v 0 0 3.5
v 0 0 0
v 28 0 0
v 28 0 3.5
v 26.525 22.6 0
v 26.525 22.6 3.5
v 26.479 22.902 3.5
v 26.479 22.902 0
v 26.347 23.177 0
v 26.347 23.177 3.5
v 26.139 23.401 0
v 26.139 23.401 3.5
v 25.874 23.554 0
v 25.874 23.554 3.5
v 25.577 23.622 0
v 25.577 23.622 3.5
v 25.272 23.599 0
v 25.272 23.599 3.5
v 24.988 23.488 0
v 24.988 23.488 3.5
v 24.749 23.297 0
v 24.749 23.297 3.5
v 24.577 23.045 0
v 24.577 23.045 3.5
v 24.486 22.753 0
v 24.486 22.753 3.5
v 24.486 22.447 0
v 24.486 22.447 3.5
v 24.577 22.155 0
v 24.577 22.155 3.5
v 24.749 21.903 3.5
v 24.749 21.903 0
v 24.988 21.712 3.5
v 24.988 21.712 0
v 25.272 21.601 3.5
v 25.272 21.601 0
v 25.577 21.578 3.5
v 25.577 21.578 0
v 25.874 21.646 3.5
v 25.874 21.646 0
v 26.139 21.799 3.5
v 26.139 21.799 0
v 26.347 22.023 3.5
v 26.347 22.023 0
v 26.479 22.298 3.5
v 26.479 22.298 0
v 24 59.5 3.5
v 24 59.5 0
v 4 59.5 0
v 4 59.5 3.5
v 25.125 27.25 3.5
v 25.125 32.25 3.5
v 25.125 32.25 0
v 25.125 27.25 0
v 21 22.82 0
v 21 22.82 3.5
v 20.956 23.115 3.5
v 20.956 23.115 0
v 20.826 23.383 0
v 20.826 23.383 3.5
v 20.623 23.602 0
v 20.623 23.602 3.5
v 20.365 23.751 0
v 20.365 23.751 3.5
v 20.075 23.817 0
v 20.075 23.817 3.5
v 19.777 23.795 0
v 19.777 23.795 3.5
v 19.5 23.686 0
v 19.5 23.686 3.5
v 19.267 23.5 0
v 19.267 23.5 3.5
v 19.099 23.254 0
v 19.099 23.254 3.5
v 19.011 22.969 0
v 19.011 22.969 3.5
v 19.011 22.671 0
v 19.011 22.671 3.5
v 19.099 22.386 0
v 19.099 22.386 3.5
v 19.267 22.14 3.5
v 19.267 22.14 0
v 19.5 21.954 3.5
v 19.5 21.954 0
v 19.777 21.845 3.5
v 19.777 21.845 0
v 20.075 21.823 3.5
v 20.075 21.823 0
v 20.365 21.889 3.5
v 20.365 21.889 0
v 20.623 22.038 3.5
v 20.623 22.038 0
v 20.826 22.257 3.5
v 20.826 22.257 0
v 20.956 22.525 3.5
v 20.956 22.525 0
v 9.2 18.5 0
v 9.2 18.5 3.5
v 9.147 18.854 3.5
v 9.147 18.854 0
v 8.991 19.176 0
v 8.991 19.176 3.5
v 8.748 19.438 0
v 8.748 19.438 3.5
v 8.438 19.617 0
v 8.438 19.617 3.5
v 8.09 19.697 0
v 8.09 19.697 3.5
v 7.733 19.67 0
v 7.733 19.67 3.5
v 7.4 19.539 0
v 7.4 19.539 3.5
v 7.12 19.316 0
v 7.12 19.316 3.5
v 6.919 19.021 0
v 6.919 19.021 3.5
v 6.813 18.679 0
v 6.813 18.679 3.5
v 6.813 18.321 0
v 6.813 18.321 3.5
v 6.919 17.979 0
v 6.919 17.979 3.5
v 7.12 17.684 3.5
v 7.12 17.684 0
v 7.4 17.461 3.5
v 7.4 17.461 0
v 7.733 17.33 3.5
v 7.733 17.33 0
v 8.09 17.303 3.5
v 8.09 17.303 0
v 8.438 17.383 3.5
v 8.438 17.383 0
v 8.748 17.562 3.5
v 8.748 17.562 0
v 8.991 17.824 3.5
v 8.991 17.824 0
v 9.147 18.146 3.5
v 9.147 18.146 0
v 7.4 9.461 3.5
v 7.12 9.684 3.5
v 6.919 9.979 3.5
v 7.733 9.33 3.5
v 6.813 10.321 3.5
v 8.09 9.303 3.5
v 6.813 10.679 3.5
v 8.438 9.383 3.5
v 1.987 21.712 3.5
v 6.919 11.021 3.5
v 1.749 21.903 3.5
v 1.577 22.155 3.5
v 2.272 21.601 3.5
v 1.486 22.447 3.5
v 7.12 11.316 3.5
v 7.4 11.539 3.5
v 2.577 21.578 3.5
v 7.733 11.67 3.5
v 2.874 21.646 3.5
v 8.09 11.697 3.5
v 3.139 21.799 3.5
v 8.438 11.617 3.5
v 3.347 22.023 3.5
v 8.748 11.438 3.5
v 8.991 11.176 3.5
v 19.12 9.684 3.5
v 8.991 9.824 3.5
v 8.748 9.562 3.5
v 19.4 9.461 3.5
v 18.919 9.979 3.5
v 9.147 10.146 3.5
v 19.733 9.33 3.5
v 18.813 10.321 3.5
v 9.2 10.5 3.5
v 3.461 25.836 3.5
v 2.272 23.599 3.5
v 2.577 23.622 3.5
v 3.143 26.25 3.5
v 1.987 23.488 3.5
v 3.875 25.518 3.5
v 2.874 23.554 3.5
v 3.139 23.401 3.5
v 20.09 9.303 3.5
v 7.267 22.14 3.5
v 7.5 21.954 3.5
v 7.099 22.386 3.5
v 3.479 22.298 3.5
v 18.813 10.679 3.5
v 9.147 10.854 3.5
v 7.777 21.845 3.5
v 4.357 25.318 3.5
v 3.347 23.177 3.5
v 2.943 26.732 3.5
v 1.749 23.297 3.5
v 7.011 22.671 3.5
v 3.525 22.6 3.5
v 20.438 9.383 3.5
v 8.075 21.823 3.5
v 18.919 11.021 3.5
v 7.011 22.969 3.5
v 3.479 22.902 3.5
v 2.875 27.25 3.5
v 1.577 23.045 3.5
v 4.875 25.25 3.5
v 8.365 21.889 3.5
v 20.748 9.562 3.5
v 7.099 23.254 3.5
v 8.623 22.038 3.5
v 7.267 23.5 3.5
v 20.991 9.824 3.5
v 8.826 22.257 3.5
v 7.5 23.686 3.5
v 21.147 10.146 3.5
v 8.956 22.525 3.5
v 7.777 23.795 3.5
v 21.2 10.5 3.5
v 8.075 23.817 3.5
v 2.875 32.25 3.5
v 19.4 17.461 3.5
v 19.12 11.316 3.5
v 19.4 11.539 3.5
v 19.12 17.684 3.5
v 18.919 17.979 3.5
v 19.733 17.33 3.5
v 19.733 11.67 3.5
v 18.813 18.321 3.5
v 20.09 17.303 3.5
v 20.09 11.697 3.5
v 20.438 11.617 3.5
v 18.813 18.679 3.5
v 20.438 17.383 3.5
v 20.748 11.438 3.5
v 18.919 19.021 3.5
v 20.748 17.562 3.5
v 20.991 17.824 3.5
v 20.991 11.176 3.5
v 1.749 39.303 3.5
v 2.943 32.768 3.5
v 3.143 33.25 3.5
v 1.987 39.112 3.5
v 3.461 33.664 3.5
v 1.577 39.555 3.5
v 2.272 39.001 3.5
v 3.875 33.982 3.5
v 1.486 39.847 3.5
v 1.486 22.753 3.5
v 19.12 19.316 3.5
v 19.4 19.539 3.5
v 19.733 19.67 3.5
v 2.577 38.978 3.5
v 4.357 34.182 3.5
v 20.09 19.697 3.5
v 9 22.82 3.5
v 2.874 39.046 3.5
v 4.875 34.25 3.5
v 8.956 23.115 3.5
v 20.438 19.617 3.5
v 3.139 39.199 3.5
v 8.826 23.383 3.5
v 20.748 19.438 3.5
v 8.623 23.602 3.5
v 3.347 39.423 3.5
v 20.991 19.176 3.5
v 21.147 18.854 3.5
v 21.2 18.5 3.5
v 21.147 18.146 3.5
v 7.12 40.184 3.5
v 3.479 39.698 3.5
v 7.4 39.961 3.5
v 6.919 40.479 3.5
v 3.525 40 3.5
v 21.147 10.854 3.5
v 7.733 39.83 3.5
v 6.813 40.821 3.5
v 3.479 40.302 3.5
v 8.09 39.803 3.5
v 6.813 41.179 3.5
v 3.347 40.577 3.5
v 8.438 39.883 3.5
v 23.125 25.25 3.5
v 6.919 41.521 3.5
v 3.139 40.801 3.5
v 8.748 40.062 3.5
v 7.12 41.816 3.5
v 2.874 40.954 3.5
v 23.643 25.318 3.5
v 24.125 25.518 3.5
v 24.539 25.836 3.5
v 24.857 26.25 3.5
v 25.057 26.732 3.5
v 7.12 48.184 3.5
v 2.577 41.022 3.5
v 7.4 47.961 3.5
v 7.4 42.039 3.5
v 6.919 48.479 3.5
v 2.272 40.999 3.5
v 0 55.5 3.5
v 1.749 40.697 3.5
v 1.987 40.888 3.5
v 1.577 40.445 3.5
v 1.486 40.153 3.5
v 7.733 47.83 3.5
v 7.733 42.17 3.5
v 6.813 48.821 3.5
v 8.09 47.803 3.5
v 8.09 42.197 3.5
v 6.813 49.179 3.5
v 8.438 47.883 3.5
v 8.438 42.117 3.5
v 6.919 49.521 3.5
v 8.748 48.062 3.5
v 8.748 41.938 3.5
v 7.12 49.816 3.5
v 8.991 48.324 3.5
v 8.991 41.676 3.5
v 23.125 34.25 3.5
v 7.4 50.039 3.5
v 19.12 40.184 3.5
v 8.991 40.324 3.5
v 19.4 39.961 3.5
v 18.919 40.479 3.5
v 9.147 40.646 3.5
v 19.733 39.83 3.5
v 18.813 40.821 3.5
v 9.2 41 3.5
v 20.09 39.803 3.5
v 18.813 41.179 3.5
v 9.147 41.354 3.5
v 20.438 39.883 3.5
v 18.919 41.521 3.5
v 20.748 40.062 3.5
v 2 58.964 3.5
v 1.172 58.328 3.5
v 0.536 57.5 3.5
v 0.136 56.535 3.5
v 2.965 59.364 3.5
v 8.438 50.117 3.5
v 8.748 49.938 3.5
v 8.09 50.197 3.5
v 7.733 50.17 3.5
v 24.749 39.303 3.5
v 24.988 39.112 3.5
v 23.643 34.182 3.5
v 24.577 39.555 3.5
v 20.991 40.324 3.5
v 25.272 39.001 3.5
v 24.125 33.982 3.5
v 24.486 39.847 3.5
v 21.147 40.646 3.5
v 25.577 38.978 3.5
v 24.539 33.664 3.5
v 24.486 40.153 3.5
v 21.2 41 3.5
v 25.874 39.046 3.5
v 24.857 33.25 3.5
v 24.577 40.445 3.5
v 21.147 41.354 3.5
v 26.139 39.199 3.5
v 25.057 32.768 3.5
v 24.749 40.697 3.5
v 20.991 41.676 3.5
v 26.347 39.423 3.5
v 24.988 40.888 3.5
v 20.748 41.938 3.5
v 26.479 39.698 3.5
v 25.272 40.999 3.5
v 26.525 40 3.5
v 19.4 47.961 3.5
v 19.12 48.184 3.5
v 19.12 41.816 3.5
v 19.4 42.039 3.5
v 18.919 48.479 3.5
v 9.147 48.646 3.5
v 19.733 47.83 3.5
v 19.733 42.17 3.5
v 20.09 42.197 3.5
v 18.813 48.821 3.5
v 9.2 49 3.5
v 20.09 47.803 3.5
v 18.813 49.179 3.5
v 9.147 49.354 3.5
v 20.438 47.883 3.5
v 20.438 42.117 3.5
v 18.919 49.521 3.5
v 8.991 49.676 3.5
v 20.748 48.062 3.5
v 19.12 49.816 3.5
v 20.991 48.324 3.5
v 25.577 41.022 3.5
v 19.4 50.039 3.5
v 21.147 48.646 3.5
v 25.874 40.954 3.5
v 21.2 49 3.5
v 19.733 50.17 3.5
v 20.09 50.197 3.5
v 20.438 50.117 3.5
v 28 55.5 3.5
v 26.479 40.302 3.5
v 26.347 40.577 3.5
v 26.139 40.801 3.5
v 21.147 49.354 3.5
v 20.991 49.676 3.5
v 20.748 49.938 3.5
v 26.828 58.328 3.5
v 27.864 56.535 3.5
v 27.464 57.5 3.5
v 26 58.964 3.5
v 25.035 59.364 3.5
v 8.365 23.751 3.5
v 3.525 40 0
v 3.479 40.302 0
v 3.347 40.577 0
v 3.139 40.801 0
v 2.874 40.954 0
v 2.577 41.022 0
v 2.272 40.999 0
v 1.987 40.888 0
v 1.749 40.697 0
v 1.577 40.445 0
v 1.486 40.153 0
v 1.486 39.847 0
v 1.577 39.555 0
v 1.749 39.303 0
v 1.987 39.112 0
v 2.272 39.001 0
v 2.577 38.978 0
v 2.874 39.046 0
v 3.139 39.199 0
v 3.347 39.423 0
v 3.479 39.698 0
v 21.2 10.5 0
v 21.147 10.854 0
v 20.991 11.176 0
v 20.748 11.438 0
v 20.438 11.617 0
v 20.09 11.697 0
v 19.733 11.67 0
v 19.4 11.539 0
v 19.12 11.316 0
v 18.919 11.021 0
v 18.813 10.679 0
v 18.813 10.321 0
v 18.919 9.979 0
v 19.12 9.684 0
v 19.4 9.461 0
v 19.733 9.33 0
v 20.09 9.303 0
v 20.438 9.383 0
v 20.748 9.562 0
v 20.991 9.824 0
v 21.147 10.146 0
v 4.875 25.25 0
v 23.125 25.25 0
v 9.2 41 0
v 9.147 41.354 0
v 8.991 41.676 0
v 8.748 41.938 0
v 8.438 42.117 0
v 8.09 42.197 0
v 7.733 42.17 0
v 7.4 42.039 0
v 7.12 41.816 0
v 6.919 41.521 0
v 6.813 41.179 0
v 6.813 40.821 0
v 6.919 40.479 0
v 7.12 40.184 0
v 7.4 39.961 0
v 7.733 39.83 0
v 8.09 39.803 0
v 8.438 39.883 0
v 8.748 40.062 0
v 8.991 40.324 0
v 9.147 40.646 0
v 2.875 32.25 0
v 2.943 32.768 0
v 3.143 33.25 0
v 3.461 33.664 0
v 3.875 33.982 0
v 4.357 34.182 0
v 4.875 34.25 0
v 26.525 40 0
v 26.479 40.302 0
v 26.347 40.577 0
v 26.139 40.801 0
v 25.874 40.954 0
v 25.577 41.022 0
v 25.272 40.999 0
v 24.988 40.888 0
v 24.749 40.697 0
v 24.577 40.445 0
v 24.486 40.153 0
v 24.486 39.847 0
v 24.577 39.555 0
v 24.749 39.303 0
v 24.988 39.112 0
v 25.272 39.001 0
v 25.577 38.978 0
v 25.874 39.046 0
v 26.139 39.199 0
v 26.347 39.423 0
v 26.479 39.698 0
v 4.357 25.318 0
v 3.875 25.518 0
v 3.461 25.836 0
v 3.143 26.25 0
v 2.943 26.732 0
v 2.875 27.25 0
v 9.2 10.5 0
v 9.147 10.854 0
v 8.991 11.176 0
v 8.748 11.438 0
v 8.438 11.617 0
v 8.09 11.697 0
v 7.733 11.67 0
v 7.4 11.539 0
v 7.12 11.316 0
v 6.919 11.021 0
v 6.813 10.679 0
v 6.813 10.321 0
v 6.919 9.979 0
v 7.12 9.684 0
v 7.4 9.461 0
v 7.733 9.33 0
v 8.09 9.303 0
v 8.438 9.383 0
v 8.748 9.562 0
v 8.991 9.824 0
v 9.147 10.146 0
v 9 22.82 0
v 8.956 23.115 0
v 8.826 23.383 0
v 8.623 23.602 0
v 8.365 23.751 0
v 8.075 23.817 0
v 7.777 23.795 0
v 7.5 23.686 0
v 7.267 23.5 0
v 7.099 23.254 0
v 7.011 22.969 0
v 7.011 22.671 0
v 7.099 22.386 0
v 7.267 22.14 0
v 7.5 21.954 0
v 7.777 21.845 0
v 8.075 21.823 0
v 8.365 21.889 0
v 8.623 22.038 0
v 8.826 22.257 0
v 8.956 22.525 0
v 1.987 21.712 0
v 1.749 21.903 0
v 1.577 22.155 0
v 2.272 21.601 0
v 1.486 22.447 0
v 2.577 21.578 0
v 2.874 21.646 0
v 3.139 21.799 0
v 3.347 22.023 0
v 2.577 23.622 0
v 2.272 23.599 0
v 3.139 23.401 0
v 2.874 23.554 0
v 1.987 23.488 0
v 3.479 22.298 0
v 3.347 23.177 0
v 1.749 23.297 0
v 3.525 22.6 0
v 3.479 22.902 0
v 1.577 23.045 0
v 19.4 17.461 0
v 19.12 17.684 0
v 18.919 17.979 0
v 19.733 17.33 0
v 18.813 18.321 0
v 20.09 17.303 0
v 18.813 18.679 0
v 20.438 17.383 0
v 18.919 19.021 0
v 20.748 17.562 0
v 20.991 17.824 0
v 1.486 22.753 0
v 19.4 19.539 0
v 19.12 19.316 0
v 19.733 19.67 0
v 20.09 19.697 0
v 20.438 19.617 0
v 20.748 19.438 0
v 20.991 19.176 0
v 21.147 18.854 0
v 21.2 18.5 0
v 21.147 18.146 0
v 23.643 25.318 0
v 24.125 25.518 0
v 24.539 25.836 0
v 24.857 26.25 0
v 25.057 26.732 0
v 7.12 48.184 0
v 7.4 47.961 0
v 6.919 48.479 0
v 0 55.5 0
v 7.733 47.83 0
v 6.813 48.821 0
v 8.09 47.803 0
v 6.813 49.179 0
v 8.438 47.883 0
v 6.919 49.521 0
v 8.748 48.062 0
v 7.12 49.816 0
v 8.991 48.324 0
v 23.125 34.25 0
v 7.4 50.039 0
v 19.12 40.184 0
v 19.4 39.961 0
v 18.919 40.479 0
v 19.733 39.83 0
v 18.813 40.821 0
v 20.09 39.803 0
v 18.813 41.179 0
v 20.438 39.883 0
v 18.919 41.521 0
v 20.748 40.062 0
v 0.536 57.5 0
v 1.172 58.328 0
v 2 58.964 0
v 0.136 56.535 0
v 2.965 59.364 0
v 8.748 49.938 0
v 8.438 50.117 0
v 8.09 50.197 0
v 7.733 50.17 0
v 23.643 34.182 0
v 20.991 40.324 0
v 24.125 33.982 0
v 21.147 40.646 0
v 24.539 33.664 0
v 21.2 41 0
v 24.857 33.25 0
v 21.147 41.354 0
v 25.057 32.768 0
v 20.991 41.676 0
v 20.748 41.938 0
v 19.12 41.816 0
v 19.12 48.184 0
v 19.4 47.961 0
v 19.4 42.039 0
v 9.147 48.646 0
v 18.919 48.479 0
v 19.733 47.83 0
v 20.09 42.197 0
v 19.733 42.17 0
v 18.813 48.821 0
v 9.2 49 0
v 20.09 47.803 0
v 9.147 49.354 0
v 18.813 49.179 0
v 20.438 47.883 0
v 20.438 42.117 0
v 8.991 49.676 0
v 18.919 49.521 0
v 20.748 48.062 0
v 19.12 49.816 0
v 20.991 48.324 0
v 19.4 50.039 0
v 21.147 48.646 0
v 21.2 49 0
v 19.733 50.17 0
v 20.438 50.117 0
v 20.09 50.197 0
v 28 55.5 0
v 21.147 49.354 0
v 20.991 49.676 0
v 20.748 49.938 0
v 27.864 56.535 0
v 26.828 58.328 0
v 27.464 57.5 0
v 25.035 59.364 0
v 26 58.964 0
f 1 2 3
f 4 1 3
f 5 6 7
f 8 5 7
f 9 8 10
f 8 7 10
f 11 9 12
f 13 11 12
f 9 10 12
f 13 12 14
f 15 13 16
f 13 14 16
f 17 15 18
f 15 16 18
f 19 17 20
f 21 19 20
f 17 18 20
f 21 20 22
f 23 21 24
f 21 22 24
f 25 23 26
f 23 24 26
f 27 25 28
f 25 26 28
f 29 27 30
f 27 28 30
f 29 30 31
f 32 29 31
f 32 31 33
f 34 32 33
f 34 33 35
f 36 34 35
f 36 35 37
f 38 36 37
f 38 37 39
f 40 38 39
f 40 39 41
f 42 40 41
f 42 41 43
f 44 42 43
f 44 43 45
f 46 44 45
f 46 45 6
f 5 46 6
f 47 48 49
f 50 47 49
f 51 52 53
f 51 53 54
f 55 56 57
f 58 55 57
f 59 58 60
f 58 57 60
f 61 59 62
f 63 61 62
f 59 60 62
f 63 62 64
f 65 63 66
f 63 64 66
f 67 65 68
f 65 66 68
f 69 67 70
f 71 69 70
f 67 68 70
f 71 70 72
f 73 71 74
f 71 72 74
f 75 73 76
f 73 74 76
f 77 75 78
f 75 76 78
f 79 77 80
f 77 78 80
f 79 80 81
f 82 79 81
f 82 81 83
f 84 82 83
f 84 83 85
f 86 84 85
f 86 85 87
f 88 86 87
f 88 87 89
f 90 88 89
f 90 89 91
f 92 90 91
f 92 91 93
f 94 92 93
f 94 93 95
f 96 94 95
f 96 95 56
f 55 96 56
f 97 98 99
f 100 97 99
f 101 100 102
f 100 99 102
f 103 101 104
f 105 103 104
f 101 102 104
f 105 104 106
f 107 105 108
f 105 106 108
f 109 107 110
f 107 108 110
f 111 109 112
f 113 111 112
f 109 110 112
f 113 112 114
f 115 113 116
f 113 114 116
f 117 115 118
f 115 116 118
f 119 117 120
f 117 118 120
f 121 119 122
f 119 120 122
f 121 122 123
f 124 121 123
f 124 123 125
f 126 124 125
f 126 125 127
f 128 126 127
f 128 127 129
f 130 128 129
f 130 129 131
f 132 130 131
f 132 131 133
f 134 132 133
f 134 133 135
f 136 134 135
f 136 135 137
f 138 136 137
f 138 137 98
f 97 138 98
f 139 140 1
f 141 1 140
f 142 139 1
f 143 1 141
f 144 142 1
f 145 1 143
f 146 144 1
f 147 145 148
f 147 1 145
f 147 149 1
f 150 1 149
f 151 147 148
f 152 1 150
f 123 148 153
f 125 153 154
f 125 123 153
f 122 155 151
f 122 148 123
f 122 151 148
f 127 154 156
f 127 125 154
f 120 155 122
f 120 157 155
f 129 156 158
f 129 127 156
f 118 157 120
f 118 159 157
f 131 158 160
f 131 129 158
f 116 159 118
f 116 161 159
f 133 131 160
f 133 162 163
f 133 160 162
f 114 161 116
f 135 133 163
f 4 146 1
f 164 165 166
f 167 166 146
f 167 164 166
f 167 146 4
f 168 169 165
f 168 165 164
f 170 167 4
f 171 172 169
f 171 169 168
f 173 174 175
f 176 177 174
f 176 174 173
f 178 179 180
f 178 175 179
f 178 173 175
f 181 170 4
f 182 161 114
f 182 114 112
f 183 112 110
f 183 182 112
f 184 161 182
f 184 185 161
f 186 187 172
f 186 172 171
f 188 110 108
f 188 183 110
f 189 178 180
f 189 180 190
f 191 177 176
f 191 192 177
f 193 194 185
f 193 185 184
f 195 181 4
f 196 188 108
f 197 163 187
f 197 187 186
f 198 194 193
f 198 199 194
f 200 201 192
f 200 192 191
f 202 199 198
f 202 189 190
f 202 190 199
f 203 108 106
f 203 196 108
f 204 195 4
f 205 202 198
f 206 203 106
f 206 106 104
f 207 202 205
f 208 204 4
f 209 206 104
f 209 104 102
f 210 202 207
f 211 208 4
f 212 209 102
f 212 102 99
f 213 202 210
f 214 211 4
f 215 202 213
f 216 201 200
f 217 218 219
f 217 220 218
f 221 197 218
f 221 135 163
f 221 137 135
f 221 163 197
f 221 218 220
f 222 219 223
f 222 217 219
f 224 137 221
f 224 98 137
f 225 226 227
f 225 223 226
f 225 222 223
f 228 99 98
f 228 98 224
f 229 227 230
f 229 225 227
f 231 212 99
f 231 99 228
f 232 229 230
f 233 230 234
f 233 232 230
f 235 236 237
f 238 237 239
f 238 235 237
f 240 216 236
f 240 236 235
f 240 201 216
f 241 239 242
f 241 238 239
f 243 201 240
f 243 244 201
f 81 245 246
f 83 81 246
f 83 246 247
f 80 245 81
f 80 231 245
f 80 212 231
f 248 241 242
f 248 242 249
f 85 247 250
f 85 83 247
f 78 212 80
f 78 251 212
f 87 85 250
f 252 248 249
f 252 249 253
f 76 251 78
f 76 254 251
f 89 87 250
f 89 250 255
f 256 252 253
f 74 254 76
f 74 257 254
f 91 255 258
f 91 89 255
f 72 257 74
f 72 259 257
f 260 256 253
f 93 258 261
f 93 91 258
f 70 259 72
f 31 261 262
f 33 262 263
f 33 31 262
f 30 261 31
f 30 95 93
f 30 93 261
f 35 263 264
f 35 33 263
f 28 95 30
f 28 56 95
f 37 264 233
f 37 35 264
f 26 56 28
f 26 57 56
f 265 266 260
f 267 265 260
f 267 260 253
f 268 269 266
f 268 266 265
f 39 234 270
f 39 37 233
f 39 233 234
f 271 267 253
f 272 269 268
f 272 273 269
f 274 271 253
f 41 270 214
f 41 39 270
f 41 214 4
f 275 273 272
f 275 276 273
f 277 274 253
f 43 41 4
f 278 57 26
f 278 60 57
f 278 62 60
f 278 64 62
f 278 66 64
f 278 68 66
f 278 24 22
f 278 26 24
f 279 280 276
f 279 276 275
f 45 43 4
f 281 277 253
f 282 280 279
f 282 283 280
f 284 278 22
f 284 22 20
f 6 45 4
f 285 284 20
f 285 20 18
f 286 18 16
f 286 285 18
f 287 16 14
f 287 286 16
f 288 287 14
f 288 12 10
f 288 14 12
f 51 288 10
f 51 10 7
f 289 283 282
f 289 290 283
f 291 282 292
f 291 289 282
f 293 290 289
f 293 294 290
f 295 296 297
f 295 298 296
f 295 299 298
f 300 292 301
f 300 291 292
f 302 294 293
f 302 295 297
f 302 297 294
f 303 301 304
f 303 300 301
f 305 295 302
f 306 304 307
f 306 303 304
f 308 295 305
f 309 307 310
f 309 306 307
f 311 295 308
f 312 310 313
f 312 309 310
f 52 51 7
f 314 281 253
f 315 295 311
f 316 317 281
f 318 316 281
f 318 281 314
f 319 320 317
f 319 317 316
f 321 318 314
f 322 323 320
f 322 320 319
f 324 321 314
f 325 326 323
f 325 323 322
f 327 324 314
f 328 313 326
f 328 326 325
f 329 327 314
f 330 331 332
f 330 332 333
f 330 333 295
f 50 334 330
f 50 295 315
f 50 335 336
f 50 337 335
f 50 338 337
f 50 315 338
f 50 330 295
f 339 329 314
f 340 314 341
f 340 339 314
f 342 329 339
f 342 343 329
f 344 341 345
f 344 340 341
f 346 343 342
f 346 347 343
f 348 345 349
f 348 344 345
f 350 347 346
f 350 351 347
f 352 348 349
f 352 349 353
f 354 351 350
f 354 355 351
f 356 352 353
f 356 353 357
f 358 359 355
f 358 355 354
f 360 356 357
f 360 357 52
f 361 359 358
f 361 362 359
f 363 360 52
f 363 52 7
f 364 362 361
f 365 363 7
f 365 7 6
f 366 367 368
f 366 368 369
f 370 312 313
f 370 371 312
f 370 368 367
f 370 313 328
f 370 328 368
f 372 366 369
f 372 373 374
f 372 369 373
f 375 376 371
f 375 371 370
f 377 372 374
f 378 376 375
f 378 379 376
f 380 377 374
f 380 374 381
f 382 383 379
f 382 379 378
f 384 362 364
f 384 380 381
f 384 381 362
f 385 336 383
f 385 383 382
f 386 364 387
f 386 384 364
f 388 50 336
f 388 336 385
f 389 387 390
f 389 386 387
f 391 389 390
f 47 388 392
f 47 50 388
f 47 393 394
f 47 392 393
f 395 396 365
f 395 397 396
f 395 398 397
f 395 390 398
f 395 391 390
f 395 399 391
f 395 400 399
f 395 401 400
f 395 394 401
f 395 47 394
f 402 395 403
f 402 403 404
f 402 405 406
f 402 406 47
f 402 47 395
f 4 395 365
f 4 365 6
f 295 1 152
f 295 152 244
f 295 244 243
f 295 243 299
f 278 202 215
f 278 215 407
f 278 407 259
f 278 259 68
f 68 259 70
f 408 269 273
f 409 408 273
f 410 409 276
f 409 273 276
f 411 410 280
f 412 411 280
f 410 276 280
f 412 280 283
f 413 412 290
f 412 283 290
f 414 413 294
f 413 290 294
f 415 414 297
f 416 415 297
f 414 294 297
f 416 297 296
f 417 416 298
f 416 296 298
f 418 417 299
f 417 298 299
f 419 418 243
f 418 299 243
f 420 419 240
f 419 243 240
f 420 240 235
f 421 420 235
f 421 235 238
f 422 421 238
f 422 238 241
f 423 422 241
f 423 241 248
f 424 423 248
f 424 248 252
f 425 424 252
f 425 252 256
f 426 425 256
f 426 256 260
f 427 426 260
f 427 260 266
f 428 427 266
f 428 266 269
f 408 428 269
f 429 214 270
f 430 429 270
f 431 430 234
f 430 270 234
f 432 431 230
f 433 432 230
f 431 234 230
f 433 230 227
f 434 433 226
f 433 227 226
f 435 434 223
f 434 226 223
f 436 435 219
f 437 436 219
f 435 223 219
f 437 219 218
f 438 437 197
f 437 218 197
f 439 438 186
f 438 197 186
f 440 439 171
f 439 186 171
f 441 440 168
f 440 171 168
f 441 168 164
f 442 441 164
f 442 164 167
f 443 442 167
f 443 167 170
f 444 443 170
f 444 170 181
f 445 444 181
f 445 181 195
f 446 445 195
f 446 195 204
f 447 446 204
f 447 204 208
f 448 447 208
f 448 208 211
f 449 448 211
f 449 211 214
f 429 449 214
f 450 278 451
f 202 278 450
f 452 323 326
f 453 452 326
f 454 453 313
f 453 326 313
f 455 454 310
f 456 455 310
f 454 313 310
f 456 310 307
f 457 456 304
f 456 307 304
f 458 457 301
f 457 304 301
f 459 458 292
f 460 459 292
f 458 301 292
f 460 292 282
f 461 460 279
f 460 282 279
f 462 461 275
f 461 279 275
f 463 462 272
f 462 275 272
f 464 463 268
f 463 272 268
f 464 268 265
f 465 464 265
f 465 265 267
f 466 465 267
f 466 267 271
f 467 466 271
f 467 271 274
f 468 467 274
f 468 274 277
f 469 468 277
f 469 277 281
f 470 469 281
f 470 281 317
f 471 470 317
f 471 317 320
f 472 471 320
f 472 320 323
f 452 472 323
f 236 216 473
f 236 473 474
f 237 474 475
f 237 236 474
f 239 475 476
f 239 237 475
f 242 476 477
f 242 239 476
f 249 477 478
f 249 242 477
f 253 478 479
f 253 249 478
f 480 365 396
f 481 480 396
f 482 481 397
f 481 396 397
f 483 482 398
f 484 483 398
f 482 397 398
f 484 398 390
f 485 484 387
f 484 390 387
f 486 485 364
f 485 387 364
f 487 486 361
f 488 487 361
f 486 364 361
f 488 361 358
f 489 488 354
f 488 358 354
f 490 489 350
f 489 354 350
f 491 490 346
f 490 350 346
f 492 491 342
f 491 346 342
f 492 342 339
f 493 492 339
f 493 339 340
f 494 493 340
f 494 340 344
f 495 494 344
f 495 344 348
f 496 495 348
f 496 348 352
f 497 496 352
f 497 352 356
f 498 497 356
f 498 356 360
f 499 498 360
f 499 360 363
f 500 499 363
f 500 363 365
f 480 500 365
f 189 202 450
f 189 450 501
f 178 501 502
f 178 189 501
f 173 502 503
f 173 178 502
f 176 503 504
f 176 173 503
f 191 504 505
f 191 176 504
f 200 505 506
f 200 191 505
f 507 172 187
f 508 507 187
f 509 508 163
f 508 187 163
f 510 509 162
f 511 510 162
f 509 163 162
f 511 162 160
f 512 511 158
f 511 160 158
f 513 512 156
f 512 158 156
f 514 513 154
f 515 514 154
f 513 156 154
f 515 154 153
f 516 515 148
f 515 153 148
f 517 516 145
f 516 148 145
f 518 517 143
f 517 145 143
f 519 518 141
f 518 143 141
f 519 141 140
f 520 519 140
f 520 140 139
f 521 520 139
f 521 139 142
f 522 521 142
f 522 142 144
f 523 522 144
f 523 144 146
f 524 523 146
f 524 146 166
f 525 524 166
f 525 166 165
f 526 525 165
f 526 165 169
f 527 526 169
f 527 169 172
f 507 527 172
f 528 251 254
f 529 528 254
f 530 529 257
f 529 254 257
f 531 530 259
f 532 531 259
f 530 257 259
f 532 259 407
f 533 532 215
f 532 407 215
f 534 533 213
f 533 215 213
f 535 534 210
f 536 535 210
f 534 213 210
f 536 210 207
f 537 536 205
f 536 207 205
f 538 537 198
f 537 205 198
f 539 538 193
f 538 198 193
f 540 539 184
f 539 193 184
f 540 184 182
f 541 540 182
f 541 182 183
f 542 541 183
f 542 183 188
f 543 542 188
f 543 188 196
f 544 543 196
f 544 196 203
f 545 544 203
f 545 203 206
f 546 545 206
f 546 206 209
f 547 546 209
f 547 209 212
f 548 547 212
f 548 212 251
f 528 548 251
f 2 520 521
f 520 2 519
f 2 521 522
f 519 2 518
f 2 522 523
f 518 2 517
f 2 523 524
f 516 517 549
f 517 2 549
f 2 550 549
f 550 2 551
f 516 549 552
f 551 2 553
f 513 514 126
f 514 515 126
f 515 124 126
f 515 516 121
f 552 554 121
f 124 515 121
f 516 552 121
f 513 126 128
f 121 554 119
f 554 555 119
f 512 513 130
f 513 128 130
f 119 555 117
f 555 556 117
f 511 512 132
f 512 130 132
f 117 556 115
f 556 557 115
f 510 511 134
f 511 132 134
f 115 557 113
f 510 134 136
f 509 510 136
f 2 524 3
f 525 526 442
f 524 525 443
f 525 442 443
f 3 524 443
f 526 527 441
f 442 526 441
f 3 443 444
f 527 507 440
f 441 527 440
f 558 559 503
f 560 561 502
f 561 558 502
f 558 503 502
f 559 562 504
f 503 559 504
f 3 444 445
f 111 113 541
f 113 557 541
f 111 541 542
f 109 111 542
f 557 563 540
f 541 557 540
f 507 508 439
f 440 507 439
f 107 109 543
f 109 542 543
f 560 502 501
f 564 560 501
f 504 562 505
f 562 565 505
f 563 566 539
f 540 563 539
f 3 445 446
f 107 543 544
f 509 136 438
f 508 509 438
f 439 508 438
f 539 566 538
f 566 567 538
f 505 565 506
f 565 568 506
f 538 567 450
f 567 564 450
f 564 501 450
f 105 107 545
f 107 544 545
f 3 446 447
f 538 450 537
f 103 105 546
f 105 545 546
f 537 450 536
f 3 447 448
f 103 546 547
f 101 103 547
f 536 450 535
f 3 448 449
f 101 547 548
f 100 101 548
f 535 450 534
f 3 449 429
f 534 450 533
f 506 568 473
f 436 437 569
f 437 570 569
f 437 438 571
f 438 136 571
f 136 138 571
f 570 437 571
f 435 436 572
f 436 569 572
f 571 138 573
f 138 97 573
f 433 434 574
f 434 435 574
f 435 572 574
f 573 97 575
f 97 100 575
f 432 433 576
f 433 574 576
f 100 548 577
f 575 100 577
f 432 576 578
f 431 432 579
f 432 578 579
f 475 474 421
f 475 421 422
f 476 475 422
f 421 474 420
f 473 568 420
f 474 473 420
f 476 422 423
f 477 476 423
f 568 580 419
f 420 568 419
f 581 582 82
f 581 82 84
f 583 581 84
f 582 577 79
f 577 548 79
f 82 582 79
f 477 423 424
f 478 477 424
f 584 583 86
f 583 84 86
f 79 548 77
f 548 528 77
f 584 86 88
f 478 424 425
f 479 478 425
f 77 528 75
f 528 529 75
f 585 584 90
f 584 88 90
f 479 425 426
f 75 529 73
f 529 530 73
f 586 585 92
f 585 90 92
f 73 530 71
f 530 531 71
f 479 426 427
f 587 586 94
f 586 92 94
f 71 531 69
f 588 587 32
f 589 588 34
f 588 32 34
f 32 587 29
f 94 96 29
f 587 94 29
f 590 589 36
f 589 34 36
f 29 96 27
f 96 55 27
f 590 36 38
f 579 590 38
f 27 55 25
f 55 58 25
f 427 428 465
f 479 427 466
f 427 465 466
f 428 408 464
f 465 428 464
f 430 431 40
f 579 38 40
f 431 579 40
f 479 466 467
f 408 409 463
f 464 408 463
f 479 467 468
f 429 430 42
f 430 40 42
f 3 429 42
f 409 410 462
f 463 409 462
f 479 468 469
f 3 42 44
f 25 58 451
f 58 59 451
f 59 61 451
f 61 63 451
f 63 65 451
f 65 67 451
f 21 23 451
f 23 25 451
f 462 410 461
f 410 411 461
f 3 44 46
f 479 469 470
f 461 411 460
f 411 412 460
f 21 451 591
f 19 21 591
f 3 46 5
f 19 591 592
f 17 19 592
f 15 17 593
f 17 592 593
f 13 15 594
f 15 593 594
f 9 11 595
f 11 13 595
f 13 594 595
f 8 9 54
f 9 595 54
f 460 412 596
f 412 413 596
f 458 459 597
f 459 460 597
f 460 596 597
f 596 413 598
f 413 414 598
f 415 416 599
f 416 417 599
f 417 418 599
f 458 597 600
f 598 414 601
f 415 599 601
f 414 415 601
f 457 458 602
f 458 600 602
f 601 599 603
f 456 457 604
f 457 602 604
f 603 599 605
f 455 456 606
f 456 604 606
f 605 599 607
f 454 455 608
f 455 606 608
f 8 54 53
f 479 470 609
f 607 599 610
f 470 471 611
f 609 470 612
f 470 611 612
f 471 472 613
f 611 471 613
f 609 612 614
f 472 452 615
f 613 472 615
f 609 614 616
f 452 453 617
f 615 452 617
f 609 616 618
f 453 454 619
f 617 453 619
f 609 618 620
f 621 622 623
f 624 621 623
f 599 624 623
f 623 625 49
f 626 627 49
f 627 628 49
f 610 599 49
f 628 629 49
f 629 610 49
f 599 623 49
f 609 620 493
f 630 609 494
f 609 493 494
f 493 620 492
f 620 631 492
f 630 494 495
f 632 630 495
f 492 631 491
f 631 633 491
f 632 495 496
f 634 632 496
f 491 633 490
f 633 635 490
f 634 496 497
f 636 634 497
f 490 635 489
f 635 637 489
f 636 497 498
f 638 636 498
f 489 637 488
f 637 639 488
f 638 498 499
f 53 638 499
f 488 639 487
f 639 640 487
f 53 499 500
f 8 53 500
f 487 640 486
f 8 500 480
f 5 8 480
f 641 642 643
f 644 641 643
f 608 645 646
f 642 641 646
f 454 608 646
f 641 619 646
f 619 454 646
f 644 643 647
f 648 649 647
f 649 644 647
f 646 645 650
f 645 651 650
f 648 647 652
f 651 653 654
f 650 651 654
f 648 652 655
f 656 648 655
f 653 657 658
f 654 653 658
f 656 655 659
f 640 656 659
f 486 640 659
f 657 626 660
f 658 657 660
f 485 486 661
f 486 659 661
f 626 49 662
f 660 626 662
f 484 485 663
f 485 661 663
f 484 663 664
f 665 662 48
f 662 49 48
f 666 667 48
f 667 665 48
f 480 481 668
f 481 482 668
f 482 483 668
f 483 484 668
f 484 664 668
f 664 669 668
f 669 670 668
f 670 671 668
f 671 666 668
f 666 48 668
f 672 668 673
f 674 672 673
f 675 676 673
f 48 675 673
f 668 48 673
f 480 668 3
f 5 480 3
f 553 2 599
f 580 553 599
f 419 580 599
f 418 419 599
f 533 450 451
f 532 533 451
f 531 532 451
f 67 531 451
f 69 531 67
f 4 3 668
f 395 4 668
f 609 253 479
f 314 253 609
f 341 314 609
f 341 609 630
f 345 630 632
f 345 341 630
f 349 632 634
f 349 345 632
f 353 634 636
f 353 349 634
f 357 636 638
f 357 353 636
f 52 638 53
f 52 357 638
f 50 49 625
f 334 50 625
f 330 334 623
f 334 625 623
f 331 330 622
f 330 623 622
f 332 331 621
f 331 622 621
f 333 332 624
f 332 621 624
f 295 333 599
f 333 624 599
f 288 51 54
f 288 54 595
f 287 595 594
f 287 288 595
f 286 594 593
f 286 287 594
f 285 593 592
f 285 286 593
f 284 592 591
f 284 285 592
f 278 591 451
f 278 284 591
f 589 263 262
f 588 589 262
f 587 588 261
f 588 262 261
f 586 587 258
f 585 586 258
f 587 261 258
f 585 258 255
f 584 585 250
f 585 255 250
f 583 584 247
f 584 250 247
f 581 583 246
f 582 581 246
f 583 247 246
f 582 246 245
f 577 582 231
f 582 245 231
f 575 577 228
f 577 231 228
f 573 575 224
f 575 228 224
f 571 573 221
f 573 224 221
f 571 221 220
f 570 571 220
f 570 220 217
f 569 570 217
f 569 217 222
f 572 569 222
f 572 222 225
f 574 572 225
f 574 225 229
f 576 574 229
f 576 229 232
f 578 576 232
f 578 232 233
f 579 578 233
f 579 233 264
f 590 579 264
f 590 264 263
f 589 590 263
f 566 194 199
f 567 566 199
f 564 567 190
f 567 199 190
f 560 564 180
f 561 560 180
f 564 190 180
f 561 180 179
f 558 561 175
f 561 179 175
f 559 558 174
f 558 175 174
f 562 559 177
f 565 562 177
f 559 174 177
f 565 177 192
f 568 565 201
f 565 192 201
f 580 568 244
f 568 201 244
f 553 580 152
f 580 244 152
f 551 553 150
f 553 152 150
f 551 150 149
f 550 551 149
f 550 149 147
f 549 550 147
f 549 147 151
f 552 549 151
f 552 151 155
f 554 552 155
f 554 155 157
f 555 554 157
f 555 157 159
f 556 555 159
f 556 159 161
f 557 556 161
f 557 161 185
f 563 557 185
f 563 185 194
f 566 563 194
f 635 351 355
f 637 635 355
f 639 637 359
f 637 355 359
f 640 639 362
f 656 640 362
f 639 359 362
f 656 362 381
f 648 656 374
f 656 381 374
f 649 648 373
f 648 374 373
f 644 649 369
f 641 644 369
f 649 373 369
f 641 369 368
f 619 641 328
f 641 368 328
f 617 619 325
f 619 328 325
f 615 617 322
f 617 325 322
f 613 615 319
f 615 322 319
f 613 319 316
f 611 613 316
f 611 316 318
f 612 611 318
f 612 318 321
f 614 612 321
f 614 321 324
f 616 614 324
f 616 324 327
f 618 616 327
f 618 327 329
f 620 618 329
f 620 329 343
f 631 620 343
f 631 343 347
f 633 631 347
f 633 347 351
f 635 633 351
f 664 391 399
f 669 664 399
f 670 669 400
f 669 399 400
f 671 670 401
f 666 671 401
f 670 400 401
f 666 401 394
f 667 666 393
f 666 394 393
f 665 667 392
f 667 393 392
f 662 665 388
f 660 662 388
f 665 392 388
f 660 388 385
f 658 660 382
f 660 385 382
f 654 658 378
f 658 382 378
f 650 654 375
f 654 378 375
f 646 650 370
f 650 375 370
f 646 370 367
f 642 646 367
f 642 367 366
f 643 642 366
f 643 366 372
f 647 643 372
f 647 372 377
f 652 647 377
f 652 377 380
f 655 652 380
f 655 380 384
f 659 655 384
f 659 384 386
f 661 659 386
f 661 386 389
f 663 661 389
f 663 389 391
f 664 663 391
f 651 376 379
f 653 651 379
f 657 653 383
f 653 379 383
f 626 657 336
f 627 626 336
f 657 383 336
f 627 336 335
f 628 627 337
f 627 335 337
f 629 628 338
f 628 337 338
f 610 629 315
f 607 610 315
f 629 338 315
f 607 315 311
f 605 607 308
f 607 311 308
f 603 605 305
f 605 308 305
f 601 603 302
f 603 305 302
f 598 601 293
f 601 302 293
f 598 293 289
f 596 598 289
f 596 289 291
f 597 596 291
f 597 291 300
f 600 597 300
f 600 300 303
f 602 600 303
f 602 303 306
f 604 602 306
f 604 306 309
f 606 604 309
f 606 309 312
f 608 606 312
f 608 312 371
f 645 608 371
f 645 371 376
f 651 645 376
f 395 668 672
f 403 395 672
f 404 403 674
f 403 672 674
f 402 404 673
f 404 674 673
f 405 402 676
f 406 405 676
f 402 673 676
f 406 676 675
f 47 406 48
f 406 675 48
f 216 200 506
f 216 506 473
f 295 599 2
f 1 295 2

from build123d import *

# Parameters (mm, degrees)
BOSS_EXTRU_1_DEPTH      = 3.5
ESQUISSE2_R             = 1.2
ESQUISSE2_R_2           = 1.025
ENL_V_MAT_EXTRU_1_DEPTH = 66.852107028
ENL_V_MAT_EXTRU_2_DEPTH = 66.852107028
ESQUISSE7_R             = 1
ENL_V_MAT_EXTRU_4_DEPTH = 66.852107028


with BuildPart() as part:
    # Esquisse1 → Boss.-Extru.1 (new body)
    with BuildSketch(Plane.XY):
        with BuildLine():
            Line((0, 0), (28, 0))
            Line((28, 0), (28, 55.5))
            ThreePointArc((28, 55.5), (26.828427125, 58.328427125), (24, 59.5))
            Line((24, 59.5), (4, 59.5))
            ThreePointArc((4, 59.5), (1.171572875, 58.328427125), (0, 55.5))
            Line((0, 55.5), (0, 0))
        make_face()
    extrude(amount=BOSS_EXTRU_1_DEPTH)

    # Esquisse2 → Enlèv. mat.-Extru.1 (cut, through all)
    with BuildSketch(Plane.XY.offset(3.5)):
        with Locations((8, 10.5)):
            Circle(ESQUISSE2_R)
        with Locations((20, 10.5)):
            Circle(ESQUISSE2_R)
        with Locations((8, 18.5)):
            Circle(ESQUISSE2_R)
        with Locations((20, 18.5)):
            Circle(ESQUISSE2_R)
        with Locations((8, 49)):
            Circle(ESQUISSE2_R)
        with Locations((8, 41)):
            Circle(ESQUISSE2_R)
        with Locations((20, 49)):
            Circle(ESQUISSE2_R)
        with Locations((20, 41)):
            Circle(ESQUISSE2_R)
        with Locations((2.5, 40)):
            Circle(ESQUISSE2_R_2)
        with Locations((2.5, 22.6)):
            Circle(ESQUISSE2_R_2)
        with Locations((25.5, 40)):
            Circle(ESQUISSE2_R_2)
        with Locations((25.5, 22.6)):
            Circle(ESQUISSE2_R_2)
    extrude(amount=-ENL_V_MAT_EXTRU_1_DEPTH, mode=Mode.SUBTRACT)

    # Esquisse3 → Enlèv. mat.-Extru.2 (cut, through all)
    with BuildSketch(Plane.XY.offset(3.5)):
        with BuildLine():
            Line((4.875, 34.25), (23.125, 34.25))
            ThreePointArc((23.125, 34.25), (24.539213562, 33.664213562), (25.125, 32.25))
            Line((25.125, 32.25), (25.125, 27.25))
            ThreePointArc((25.125, 27.25), (24.539213562, 25.835786438), (23.125, 25.25))
            Line((23.125, 25.25), (4.875, 25.25))
            ThreePointArc((4.875, 25.25), (3.460786438, 25.835786438), (2.875, 27.25))
            Line((2.875, 27.25), (2.875, 32.25))
            ThreePointArc((2.875, 32.25), (3.460786438, 33.664213562), (4.875, 34.25))
        make_face()
    extrude(amount=-ENL_V_MAT_EXTRU_2_DEPTH, mode=Mode.SUBTRACT)

    # Esquisse7 → Enlèv. mat.-Extru.4 (cut, through all)
    with BuildSketch(Plane.XY.offset(3.5)):
        with Locations((8, 22.82)):
            Circle(ESQUISSE7_R)
        with Locations((20, 22.82)):
            Circle(ESQUISSE7_R)
    extrude(amount=-ENL_V_MAT_EXTRU_4_DEPTH, mode=Mode.SUBTRACT)


solid = part.part
